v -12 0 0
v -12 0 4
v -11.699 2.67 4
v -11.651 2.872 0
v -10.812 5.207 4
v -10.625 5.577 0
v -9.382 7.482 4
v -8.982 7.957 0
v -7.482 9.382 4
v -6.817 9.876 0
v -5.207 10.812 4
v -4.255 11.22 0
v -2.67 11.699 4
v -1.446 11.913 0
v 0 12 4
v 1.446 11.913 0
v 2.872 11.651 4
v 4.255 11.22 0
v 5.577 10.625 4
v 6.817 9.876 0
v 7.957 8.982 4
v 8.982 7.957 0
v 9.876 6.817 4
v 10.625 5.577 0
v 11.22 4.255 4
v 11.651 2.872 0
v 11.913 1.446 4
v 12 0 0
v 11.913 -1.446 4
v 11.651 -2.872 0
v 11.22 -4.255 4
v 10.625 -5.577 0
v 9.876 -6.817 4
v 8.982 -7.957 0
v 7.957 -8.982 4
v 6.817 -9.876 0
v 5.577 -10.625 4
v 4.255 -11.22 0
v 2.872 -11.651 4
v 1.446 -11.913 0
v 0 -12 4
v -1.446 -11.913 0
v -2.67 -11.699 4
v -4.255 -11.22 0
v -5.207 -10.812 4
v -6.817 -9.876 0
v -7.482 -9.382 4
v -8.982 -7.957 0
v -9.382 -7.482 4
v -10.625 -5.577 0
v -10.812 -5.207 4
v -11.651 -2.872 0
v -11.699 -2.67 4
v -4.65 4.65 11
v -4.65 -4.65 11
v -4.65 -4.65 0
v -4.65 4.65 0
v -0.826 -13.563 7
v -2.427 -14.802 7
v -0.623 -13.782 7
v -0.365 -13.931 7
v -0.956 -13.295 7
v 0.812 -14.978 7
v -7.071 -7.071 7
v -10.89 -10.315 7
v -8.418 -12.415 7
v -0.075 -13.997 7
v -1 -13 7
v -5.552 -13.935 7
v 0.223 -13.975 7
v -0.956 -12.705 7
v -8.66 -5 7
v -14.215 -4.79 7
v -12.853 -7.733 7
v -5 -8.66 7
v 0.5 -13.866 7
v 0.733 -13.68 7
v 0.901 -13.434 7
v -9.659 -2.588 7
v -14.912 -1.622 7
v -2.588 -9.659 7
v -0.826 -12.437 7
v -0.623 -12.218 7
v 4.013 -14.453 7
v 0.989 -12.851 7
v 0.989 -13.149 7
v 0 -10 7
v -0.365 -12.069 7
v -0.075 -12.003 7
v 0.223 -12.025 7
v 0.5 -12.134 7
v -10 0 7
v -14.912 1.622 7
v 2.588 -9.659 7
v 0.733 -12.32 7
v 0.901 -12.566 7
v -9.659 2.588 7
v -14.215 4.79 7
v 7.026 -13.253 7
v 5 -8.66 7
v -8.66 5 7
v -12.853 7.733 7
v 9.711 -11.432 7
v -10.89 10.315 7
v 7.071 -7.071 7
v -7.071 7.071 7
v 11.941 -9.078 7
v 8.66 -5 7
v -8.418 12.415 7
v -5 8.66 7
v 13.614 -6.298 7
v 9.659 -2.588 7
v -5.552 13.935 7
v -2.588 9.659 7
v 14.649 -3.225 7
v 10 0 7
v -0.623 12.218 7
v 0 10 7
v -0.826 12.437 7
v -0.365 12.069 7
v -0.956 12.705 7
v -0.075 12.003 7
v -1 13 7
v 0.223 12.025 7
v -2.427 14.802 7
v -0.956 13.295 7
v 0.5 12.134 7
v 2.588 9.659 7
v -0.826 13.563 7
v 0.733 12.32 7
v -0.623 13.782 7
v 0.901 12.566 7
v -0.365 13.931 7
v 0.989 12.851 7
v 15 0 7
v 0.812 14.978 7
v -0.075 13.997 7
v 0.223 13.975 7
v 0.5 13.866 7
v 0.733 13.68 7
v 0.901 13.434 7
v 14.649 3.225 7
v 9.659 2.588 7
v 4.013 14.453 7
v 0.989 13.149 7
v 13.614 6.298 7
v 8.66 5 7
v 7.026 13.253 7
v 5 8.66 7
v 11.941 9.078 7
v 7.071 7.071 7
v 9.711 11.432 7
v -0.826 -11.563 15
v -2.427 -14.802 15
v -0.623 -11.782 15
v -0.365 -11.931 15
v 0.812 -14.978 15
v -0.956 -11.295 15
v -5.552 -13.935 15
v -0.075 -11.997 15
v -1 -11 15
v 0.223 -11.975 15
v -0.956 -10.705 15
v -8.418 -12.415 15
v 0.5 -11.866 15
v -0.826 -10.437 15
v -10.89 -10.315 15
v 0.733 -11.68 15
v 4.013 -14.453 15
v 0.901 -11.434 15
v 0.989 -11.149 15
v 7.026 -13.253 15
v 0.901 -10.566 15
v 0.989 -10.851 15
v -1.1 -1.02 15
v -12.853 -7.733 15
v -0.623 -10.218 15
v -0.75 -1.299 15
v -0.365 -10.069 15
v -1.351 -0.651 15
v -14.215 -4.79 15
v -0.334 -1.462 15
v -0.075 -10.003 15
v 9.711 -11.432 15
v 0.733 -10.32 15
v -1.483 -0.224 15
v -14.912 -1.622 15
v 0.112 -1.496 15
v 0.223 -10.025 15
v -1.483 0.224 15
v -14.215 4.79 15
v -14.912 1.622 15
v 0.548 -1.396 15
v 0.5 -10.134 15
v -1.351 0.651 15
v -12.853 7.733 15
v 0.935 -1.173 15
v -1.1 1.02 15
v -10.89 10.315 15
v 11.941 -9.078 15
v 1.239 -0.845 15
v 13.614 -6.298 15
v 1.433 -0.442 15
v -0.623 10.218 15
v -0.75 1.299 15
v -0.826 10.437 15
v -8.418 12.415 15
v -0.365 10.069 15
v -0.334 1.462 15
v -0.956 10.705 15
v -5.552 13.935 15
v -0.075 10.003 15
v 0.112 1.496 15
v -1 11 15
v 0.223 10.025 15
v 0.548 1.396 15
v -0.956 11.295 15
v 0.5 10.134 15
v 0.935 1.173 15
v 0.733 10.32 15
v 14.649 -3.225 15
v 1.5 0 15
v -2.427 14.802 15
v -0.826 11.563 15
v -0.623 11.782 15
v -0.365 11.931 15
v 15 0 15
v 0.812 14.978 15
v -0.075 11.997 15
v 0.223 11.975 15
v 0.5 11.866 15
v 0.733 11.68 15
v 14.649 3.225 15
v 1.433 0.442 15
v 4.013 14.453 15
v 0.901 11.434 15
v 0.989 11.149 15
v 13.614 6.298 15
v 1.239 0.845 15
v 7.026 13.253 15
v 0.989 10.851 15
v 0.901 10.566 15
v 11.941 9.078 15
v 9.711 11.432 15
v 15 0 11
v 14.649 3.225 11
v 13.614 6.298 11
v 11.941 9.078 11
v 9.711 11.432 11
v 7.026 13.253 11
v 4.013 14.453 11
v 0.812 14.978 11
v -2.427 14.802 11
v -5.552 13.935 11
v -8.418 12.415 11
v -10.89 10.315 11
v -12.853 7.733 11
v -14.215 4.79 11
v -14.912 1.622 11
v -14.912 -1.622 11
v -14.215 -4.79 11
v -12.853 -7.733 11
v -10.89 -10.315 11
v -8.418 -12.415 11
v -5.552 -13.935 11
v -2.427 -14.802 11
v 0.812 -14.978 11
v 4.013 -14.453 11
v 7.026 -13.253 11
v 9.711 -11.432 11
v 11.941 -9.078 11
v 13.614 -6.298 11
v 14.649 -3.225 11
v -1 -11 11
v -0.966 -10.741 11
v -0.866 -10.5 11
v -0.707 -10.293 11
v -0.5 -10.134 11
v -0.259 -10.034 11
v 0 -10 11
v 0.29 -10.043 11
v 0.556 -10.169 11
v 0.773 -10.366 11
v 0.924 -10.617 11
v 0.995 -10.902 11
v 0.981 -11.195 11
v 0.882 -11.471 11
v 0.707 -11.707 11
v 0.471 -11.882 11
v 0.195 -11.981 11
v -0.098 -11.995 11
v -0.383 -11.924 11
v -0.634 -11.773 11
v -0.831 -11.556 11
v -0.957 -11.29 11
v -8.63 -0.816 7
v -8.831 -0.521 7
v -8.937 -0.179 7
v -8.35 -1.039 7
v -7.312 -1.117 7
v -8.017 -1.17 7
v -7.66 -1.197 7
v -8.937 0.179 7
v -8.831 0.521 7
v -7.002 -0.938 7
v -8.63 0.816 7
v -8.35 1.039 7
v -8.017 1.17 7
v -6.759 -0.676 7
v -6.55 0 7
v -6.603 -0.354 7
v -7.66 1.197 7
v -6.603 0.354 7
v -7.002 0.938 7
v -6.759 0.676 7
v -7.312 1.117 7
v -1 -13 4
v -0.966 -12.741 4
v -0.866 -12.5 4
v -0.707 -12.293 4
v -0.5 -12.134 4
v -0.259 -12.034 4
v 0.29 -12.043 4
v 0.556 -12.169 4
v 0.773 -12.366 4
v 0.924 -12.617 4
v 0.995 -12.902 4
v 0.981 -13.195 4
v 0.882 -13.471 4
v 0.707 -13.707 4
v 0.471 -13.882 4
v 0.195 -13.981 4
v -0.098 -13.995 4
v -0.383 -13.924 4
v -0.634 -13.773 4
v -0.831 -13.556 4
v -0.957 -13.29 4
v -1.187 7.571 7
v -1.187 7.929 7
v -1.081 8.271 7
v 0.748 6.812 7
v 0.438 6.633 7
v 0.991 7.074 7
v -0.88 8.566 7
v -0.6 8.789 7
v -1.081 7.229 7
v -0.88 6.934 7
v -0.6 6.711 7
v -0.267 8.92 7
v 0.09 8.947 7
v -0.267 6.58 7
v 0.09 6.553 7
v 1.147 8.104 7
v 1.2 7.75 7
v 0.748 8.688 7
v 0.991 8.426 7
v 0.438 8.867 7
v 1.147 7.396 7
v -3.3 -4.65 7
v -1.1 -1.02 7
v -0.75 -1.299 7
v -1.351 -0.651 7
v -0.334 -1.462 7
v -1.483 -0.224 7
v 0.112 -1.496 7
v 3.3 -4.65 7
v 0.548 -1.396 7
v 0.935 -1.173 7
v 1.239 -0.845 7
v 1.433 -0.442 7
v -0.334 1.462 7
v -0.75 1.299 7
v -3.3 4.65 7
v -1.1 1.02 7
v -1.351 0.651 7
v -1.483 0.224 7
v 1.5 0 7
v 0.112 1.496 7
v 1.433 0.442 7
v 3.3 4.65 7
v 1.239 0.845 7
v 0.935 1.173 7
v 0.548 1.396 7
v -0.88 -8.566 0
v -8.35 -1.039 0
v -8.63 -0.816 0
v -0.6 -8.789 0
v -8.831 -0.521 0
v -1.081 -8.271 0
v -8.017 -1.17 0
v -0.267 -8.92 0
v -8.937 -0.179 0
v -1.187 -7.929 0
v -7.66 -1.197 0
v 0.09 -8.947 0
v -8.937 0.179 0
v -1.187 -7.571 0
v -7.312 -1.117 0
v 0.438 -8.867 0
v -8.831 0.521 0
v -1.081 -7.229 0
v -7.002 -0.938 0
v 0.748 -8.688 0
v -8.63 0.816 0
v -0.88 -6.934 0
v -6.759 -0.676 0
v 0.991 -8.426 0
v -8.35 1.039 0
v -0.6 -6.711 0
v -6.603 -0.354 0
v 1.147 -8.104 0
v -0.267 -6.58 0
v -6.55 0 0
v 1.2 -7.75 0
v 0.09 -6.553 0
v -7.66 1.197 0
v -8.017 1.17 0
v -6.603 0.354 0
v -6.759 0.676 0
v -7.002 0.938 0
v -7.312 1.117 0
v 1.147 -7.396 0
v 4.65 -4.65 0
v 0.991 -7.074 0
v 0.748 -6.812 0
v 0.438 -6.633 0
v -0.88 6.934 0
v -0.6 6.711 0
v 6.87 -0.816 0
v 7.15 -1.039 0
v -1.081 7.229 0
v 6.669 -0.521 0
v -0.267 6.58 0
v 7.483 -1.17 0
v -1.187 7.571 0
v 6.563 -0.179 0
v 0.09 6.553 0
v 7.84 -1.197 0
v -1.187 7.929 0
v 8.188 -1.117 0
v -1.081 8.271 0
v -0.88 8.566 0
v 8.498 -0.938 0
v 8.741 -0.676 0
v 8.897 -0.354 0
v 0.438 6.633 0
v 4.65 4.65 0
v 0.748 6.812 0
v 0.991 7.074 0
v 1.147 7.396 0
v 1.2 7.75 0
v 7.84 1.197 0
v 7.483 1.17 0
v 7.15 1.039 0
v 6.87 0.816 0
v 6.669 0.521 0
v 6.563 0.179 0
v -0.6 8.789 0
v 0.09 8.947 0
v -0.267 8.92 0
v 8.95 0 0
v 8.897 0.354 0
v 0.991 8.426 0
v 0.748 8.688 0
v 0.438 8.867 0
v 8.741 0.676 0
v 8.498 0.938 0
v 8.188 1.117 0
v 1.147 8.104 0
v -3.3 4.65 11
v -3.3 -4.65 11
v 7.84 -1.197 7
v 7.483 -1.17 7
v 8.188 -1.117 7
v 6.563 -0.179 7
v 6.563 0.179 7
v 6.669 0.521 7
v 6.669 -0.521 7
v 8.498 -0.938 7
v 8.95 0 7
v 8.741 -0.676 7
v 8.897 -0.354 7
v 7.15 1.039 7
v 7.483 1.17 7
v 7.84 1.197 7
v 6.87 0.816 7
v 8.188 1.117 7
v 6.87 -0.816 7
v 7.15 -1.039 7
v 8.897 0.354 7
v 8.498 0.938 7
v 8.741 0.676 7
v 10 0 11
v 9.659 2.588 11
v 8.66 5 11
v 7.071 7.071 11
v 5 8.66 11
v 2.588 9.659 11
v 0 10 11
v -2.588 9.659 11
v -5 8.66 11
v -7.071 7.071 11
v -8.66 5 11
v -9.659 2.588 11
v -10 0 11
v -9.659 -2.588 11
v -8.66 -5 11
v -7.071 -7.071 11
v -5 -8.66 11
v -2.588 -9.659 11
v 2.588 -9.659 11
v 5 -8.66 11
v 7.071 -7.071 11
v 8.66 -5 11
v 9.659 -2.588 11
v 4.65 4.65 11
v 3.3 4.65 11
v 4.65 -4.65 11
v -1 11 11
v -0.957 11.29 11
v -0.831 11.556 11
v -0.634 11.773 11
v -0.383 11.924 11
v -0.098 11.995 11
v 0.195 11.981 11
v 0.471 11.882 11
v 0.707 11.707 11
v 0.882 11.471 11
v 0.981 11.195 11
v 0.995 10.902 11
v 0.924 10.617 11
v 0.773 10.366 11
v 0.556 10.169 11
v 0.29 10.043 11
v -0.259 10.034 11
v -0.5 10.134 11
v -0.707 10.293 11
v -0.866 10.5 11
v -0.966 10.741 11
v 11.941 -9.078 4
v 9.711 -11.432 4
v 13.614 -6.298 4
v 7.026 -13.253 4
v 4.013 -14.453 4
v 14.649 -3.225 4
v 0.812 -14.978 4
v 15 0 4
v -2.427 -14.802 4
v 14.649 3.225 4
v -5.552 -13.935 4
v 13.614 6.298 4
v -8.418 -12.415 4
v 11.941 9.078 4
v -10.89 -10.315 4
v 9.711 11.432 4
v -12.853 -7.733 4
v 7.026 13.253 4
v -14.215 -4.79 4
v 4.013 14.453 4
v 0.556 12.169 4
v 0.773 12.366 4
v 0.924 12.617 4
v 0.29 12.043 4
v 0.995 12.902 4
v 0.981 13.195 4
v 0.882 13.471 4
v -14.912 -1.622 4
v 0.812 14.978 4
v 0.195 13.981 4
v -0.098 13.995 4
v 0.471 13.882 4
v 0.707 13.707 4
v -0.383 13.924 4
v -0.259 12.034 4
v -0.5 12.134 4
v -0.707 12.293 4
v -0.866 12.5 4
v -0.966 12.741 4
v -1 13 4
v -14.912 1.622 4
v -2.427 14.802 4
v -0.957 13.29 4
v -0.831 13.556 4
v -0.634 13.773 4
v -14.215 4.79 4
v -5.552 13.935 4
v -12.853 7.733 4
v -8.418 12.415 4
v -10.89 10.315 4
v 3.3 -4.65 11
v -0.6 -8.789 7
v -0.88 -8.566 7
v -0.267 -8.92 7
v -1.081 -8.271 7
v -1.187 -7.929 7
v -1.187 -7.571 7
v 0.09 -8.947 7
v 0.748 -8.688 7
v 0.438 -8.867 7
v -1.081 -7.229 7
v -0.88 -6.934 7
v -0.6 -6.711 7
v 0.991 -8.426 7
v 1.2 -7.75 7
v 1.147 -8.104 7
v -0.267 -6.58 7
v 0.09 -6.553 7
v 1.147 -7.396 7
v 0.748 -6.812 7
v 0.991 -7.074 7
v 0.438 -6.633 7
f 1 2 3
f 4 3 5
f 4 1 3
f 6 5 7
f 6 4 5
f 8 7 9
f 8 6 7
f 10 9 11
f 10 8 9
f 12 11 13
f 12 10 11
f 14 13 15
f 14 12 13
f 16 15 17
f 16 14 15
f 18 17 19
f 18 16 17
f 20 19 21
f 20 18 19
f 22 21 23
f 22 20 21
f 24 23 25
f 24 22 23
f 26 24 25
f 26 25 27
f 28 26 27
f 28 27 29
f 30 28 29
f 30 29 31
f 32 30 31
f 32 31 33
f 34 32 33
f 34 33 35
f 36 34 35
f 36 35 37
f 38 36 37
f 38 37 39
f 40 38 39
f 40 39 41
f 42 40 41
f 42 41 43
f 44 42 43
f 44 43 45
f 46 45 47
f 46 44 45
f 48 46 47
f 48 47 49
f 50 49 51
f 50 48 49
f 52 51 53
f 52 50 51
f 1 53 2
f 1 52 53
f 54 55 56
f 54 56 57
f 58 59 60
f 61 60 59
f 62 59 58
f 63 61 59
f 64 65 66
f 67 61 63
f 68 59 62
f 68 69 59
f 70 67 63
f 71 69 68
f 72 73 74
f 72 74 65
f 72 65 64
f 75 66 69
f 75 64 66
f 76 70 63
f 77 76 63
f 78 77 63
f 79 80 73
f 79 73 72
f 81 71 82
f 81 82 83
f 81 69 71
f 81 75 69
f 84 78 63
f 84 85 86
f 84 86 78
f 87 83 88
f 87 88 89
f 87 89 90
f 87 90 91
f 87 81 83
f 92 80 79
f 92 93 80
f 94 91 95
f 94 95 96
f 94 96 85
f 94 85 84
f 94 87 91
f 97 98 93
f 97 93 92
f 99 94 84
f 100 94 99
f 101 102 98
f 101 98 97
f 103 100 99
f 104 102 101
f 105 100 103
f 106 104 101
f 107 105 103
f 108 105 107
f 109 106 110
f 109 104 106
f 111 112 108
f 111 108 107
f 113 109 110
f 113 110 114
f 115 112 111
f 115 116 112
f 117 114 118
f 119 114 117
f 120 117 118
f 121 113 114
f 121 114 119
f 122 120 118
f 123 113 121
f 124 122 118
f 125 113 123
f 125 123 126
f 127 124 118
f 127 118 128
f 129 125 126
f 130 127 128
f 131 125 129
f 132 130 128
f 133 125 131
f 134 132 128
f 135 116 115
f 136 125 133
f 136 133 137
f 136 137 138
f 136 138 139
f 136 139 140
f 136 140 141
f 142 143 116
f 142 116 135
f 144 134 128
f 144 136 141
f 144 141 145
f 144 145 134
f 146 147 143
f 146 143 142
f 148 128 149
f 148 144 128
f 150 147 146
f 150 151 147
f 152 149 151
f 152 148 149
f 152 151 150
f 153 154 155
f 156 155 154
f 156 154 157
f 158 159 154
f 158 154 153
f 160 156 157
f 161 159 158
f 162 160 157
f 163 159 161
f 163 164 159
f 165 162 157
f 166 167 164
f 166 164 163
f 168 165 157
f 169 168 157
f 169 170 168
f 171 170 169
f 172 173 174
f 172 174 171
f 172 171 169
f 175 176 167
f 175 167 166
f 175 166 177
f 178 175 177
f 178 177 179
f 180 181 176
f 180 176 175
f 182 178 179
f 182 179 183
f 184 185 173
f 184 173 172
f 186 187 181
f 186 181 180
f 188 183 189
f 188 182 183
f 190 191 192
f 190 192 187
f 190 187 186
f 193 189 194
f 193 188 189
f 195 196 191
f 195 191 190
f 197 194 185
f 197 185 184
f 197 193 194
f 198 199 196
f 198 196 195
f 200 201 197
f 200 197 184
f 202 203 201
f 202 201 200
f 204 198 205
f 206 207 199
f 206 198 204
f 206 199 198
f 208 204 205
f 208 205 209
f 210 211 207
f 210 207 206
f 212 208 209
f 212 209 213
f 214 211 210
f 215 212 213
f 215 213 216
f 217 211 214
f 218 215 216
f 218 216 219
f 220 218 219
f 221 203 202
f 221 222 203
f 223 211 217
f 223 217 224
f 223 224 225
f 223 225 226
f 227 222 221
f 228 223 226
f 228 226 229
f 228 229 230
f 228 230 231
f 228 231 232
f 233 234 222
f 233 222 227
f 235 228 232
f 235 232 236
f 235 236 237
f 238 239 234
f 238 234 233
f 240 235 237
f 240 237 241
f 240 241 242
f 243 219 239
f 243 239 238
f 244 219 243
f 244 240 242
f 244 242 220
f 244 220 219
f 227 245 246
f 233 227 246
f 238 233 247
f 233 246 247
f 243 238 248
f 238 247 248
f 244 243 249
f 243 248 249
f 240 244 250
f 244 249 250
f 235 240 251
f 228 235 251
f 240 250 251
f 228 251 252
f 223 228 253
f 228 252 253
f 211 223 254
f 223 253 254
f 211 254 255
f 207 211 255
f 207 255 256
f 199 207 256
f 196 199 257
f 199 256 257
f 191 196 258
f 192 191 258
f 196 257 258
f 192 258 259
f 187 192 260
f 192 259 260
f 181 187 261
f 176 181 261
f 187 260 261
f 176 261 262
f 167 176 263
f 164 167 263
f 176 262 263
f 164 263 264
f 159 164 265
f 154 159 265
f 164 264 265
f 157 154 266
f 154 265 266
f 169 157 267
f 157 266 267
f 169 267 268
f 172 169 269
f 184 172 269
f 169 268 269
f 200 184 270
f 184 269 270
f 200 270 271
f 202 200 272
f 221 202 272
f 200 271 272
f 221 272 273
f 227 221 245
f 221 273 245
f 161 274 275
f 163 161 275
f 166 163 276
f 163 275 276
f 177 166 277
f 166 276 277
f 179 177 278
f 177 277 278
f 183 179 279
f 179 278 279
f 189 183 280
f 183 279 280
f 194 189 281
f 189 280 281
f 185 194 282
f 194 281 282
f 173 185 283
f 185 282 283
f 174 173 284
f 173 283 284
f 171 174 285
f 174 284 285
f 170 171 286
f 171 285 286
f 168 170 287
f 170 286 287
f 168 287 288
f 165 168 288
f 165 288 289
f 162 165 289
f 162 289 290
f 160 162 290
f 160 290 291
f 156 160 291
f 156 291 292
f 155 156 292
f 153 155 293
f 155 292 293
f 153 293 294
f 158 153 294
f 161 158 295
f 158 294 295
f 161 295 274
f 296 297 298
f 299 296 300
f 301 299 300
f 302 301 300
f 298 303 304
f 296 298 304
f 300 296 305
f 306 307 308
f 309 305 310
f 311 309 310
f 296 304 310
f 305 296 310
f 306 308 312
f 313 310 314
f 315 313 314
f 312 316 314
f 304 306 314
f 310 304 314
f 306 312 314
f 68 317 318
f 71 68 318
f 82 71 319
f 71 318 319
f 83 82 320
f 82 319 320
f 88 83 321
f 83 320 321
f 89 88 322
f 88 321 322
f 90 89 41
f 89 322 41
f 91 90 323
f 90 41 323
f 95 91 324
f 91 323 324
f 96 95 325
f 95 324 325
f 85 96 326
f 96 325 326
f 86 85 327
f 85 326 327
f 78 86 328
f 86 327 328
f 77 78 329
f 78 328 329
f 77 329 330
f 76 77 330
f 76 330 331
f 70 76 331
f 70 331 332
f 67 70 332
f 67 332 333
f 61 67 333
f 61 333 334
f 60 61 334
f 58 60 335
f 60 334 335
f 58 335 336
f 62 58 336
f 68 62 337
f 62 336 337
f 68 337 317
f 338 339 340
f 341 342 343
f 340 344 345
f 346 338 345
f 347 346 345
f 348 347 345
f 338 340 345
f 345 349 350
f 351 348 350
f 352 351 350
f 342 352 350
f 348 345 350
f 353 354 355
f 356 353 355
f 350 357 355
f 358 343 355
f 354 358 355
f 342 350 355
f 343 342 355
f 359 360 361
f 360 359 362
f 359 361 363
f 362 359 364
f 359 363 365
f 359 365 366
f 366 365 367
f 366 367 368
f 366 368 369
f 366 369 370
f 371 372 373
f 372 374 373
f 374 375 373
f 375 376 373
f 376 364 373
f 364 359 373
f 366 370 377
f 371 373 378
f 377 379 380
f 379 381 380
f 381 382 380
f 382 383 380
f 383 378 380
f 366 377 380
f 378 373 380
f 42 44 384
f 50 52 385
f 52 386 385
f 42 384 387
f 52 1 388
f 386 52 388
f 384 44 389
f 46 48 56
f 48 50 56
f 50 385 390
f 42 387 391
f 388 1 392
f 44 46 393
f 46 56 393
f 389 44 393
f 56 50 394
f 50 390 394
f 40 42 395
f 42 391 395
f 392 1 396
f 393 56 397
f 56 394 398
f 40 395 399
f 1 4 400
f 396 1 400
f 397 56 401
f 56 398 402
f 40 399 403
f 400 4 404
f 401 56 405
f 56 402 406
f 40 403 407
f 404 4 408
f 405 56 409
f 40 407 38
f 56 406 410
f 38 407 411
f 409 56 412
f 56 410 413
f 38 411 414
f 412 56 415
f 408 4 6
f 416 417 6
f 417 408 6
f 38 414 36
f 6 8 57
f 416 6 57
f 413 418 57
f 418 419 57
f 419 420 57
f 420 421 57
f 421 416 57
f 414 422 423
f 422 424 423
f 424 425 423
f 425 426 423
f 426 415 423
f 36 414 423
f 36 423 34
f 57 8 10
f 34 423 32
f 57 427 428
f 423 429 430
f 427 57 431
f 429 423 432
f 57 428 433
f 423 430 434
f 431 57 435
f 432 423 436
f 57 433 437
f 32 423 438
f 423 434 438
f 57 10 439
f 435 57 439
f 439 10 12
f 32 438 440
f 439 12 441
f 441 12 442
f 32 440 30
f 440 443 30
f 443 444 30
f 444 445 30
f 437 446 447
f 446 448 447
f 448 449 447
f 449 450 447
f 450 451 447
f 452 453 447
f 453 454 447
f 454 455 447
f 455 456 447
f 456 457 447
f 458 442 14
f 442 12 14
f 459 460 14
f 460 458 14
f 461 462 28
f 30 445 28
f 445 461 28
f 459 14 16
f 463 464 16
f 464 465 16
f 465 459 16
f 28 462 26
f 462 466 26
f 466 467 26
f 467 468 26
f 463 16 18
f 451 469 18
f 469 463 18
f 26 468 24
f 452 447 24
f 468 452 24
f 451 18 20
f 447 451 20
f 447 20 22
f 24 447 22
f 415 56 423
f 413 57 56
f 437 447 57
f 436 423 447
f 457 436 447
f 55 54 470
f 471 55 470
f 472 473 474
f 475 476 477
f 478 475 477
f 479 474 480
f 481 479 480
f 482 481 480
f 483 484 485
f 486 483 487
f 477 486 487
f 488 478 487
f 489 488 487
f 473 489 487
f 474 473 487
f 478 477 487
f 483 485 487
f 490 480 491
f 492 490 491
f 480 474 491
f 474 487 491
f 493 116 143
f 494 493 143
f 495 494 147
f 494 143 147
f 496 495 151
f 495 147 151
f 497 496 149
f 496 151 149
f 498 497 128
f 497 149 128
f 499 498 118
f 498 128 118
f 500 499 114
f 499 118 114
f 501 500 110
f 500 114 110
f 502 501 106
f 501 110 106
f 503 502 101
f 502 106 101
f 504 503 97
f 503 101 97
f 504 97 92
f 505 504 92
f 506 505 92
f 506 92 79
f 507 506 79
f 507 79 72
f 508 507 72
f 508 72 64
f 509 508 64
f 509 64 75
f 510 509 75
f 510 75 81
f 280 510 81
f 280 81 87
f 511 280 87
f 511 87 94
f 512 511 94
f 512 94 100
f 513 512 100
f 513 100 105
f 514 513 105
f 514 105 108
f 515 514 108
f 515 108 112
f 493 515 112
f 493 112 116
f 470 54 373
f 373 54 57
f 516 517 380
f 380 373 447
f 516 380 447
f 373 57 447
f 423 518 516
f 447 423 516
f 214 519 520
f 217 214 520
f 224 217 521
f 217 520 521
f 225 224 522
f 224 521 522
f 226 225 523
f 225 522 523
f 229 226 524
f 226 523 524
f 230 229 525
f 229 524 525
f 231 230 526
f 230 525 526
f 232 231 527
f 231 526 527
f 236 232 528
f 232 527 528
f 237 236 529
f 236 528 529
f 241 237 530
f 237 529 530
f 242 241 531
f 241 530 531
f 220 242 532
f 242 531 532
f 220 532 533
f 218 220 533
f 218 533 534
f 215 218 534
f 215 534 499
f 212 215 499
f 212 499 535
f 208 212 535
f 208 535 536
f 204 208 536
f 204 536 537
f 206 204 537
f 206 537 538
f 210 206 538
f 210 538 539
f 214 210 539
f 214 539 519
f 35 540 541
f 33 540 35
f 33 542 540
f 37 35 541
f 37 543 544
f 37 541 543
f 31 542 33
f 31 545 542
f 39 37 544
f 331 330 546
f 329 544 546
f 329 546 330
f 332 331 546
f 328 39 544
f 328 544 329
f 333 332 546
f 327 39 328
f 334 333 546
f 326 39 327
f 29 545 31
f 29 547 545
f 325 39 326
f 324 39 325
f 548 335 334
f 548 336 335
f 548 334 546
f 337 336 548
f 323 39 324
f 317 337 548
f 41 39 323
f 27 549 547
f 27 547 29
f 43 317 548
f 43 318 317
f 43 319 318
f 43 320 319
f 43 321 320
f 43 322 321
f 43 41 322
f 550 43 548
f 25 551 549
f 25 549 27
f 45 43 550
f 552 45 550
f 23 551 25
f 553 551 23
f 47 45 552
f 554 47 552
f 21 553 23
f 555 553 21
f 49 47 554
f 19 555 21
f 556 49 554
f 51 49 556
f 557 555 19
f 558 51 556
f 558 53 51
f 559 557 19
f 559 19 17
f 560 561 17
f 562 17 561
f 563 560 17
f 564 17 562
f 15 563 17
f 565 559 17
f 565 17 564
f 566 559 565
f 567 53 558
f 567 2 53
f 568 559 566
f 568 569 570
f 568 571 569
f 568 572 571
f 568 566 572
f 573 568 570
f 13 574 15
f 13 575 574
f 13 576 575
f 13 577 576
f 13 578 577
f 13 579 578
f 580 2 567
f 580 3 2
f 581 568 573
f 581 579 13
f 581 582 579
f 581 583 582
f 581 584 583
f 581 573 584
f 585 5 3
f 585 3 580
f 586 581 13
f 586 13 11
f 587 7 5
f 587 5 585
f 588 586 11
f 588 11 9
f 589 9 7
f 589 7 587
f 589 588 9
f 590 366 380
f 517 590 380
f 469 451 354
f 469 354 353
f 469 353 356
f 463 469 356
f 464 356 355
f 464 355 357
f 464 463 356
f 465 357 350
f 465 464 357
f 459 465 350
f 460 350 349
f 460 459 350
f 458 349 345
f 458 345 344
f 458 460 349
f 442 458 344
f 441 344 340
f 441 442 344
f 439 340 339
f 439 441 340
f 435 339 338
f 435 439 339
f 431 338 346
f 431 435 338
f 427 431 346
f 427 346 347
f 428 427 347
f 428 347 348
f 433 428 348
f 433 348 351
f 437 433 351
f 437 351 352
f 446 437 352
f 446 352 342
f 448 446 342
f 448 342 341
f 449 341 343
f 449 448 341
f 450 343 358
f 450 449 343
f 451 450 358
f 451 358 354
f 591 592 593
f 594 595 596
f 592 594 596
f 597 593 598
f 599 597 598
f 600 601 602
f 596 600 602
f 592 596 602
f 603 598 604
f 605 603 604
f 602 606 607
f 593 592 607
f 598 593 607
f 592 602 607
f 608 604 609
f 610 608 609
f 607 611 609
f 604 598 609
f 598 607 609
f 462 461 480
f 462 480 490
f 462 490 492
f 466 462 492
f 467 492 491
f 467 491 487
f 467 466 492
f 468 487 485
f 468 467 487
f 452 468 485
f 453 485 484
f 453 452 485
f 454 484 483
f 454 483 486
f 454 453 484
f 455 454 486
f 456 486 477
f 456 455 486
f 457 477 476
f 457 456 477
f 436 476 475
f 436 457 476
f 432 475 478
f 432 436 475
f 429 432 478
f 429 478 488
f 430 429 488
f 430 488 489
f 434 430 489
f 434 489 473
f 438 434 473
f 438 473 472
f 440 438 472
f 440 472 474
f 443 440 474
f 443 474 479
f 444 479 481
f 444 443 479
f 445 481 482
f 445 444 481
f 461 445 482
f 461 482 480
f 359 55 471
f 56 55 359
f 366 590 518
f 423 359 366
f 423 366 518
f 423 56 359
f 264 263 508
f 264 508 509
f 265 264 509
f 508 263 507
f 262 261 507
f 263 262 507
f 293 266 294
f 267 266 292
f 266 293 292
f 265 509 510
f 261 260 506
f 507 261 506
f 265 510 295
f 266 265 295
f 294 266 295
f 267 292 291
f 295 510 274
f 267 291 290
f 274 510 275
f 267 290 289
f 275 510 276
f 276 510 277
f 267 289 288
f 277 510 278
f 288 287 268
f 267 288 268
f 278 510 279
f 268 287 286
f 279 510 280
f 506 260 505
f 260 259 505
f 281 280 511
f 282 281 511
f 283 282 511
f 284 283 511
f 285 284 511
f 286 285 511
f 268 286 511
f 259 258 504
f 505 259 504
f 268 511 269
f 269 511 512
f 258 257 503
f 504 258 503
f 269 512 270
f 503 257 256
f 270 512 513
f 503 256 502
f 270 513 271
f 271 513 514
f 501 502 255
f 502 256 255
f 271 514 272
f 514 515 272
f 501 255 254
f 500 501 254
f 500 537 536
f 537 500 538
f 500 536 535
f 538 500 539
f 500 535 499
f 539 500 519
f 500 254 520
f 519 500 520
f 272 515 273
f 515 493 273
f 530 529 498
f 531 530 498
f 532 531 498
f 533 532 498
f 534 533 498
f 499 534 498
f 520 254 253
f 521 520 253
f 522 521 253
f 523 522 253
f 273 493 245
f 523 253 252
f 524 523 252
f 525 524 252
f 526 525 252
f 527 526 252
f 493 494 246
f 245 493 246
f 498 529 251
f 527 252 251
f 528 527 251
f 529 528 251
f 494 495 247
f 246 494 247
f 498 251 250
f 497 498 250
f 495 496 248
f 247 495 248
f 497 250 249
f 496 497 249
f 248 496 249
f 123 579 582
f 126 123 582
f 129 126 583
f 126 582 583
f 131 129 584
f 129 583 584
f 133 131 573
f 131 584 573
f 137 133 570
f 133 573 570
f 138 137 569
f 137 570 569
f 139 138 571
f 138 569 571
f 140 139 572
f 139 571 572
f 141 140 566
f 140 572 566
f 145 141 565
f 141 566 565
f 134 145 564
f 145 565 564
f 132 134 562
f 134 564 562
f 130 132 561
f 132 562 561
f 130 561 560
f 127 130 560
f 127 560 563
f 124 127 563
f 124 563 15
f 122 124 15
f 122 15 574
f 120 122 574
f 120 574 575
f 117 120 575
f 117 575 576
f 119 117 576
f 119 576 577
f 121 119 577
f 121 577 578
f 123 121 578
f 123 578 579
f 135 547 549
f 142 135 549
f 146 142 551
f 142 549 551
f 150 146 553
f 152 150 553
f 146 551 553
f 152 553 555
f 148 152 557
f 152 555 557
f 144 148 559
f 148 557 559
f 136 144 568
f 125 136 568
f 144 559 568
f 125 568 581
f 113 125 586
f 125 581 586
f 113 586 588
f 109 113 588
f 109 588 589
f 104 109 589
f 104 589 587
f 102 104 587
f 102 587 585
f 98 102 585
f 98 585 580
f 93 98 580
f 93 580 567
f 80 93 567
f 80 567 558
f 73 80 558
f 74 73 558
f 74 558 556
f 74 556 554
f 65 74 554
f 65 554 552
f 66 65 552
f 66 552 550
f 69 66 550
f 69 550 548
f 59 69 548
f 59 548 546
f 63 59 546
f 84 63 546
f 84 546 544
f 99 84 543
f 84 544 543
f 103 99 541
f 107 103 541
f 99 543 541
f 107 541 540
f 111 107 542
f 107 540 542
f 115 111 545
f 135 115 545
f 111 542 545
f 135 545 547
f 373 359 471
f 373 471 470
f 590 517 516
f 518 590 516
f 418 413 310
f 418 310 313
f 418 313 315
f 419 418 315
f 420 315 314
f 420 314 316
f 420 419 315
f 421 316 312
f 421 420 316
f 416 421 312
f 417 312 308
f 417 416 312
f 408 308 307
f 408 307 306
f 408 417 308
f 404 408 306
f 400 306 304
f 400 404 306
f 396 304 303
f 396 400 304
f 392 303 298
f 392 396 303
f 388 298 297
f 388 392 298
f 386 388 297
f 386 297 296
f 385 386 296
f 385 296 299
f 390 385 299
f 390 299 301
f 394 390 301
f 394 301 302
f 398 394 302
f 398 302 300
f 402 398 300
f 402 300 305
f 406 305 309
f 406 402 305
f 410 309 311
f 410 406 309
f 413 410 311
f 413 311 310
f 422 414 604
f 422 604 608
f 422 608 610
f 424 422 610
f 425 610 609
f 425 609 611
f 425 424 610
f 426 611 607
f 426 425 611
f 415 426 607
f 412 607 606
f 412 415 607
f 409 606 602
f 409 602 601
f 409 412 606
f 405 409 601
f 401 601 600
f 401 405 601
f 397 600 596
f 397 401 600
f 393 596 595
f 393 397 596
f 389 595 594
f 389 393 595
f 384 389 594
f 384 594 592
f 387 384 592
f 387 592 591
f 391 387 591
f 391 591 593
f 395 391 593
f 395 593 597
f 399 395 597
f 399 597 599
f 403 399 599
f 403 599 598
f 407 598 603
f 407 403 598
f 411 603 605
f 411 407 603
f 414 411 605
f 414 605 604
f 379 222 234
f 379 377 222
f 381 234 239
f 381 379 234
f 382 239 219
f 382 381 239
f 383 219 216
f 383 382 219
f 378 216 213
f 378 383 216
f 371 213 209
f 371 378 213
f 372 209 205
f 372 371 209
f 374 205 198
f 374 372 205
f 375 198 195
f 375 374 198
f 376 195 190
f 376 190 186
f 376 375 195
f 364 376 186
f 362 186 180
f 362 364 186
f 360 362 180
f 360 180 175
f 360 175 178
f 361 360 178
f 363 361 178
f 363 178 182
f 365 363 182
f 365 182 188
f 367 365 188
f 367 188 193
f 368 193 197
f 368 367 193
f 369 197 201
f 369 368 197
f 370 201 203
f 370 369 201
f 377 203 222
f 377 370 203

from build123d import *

# Parameters (mm, degrees)
SKETCH1_R           = 15
SKETCH1_R_2         = 1.2
SKETCH1_W           = 9.3
SKETCH1_H           = 9.3
BOSS_EXTRUDE1_DEPTH = 7
SKETCH2_R           = 10
SKETCH2_R_2         = 1.5
SKETCH2_W           = 1.35
SKETCH2_H           = 9.3
BOSS_EXTRUDE2_DEPTH = 4
SKETCH3_R           = 15
SKETCH3_R_2         = 1.5
BOSS_EXTRUDE3_DEPTH = 4
SKETCH4_R           = 15
SKETCH4_R_2         = 12
CUT_EXTRUDE1_DEPTH  = 4
SKETCH5_R           = 1
CUT_EXTRUDE2_DEPTH  = 3
SKETCH6_R           = 1
CUT_EXTRUDE5_DEPTH  = 5


with BuildPart() as part:
    # Sketch1 → Boss-Extrude1 (new body)
    with BuildSketch(Plane.XY):
        Circle(SKETCH1_R)
        with Locations((0, 7.75)):
            Circle(SKETCH1_R_2, mode=Mode.SUBTRACT)
        with Locations((7.75, 0)):
            Circle(SKETCH1_R_2, mode=Mode.SUBTRACT)
        with Locations((0, -7.75)):
            Circle(SKETCH1_R_2, mode=Mode.SUBTRACT)
        with Locations((-7.75, 0)):
            Circle(SKETCH1_R_2, mode=Mode.SUBTRACT)
        Rectangle(SKETCH1_W, SKETCH1_H, mode=Mode.SUBTRACT)
    extrude(amount=BOSS_EXTRUDE1_DEPTH)

    # Sketch2 → Boss-Extrude2 (add)
    with BuildSketch(Plane.XY.offset(7)):
        Circle(SKETCH2_R)
        Circle(SKETCH2_R_2, mode=Mode.SUBTRACT)
        with Locations((-3.975, 0)):
            Rectangle(SKETCH2_W, SKETCH2_H, mode=Mode.SUBTRACT)
        with Locations((3.975, 0)):
            Rectangle(SKETCH2_W, SKETCH2_H, mode=Mode.SUBTRACT)
    extrude(amount=BOSS_EXTRUDE2_DEPTH)

    # Sketch3 → Boss-Extrude3 (add)
    with BuildSketch(Plane.XY.offset(11)):
        Circle(SKETCH3_R)
        Circle(SKETCH3_R_2, mode=Mode.SUBTRACT)
    extrude(amount=BOSS_EXTRUDE3_DEPTH)

    # Sketch4 → Cut-Extrude1 (cut)
    with BuildSketch(Plane(origin=(0, 0, 0), x_dir=(-1, 0, 0), z_dir=(0, 0, -1))):
        Circle(SKETCH4_R)
        Circle(SKETCH4_R_2, mode=Mode.SUBTRACT)
    extrude(amount=-CUT_EXTRUDE1_DEPTH, mode=Mode.SUBTRACT)

    # Sketch5 → Cut-Extrude2 (cut)
    with BuildSketch(Plane(origin=(0, 0, 4), x_dir=(-1, 0, 0), z_dir=(0, 0, -1))):
        with Locations((0, 13)):
            Circle(SKETCH5_R)
        with Locations((0, -13)):
            Circle(SKETCH5_R)
    extrude(amount=-CUT_EXTRUDE2_DEPTH, mode=Mode.SUBTRACT)

    # Sketch6 → Cut-Extrude5 (cut, through all)
    with BuildSketch(Plane(origin=(0, 0, 11), x_dir=(-1, 0, 0), z_dir=(0, 0, -1))):
        with Locations((0, 11)):
            Circle(SKETCH6_R)
        with Locations((0, -11)):
            Circle(SKETCH6_R)
    extrude(amount=-CUT_EXTRUDE5_DEPTH, mode=Mode.SUBTRACT)


solid = part.part
